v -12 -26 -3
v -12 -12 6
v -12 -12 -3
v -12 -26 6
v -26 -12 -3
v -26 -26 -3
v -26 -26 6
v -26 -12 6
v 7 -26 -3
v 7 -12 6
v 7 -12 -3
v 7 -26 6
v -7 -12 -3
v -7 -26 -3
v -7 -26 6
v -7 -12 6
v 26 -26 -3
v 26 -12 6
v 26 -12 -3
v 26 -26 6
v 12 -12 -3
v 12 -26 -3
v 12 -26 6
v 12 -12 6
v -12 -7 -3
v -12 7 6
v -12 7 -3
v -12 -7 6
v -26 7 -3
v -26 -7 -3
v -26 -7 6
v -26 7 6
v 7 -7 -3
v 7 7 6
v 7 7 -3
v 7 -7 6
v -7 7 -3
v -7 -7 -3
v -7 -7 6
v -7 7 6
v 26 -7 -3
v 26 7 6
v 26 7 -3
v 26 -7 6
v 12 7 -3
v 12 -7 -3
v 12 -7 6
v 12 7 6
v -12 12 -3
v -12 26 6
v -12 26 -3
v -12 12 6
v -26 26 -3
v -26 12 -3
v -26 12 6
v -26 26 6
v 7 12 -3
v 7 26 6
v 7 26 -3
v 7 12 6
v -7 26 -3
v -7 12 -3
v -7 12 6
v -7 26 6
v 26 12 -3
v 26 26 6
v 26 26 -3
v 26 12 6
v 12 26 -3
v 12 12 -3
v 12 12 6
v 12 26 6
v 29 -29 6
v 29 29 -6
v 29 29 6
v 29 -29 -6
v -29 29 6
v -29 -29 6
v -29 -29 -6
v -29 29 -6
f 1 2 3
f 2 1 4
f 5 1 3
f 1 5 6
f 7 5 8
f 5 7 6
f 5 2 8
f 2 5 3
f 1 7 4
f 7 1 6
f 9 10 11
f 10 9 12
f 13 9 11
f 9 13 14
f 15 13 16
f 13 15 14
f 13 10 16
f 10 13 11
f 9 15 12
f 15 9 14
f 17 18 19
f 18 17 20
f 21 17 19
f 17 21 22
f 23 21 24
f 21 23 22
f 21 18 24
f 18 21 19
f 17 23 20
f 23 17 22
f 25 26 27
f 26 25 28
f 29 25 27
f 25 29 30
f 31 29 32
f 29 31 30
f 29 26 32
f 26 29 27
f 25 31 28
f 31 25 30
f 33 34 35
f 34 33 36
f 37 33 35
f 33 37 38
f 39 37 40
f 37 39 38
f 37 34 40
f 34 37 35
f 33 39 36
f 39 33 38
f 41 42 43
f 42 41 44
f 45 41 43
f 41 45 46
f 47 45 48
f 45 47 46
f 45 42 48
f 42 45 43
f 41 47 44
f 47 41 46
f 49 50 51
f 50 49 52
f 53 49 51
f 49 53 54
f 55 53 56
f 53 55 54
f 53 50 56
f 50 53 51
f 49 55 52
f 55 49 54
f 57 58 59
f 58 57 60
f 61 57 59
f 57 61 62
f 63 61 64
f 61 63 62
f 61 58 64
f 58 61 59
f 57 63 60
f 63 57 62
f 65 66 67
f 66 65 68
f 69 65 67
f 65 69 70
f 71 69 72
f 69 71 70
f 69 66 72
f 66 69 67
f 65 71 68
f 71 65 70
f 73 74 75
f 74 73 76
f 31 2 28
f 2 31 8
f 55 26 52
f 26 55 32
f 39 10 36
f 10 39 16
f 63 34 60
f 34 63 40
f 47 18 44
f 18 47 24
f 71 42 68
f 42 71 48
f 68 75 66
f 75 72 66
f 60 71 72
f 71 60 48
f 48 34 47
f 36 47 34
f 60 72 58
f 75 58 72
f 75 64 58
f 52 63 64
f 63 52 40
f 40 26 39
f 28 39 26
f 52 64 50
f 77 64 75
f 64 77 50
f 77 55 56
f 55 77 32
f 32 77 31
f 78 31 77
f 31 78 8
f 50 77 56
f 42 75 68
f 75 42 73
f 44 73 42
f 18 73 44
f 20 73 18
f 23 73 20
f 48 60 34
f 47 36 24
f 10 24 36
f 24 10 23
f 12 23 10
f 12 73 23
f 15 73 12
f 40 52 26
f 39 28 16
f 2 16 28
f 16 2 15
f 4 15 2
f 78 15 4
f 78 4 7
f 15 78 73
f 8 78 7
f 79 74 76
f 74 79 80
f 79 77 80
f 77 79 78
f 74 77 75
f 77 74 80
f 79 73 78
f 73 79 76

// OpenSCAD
$fn = 32;

// ----------------------------------------------------------------------
// Pocket plate 58 x 58 x 12
// 3 x 3 pockets 14 mm square, 9 mm deep
// ----------------------------------------------------------------------

// --- parameters (mm) ---
thickness = 12;  // plate thickness
floor_t = 3;     // material left under each pocket
pocket = 14;     // pocket side length
pitch_x = 19;    // pocket pitch along X
pitch_y = 19;    // pocket pitch along Y
cols = 3;        // pockets per row
rows = 3;        // rows of pockets

// --- derived feature positions (mm) ---
depth = thickness - floor_t;        // = 9   pocket depth, down to the floor
span_x = (cols - 1) * pitch_x;      // = 38   distance between outer pockets
span_y = (rows - 1) * pitch_y;      // = 38   distance between outer pocket rows
origin_x = -span_x / 2;             // = -19   X of the first pocket
origin_y = -span_y / 2;             // = -19   Y of the first pocket
plate = [span_x + pocket + 6, span_y + pocket + 6, thickness];  // = [58, 58, 12]   overall size: pockets plus 3 mm of wall on each side
feature_centers = [
  [origin_x + 0 * pitch_x, origin_y + 0 * pitch_y],
  [origin_x + 1 * pitch_x, origin_y + 0 * pitch_y],
  [origin_x + 2 * pitch_x, origin_y + 0 * pitch_y],
  [origin_x + 0 * pitch_x, origin_y + 1 * pitch_y],
  [origin_x + 1 * pitch_x, origin_y + 1 * pitch_y],
  [origin_x + 2 * pitch_x, origin_y + 1 * pitch_y],
  [origin_x + 0 * pitch_x, origin_y + 2 * pitch_y],
  [origin_x + 1 * pitch_x, origin_y + 2 * pitch_y],
  [origin_x + 2 * pitch_x, origin_y + 2 * pitch_y]
];   // pocket centres, used verbatim by the cutter loop

// plate outline, then one pocket per centre in feature_centers
difference() {
  cube(plate, center = true);
  for (centre = feature_centers)
    translate([centre[0] - pocket / 2, centre[1] - pocket / 2, plate[2] / 2 - depth])
      cube([pocket, pocket, depth + 1]);  // centred on the declared pocket centre
}
